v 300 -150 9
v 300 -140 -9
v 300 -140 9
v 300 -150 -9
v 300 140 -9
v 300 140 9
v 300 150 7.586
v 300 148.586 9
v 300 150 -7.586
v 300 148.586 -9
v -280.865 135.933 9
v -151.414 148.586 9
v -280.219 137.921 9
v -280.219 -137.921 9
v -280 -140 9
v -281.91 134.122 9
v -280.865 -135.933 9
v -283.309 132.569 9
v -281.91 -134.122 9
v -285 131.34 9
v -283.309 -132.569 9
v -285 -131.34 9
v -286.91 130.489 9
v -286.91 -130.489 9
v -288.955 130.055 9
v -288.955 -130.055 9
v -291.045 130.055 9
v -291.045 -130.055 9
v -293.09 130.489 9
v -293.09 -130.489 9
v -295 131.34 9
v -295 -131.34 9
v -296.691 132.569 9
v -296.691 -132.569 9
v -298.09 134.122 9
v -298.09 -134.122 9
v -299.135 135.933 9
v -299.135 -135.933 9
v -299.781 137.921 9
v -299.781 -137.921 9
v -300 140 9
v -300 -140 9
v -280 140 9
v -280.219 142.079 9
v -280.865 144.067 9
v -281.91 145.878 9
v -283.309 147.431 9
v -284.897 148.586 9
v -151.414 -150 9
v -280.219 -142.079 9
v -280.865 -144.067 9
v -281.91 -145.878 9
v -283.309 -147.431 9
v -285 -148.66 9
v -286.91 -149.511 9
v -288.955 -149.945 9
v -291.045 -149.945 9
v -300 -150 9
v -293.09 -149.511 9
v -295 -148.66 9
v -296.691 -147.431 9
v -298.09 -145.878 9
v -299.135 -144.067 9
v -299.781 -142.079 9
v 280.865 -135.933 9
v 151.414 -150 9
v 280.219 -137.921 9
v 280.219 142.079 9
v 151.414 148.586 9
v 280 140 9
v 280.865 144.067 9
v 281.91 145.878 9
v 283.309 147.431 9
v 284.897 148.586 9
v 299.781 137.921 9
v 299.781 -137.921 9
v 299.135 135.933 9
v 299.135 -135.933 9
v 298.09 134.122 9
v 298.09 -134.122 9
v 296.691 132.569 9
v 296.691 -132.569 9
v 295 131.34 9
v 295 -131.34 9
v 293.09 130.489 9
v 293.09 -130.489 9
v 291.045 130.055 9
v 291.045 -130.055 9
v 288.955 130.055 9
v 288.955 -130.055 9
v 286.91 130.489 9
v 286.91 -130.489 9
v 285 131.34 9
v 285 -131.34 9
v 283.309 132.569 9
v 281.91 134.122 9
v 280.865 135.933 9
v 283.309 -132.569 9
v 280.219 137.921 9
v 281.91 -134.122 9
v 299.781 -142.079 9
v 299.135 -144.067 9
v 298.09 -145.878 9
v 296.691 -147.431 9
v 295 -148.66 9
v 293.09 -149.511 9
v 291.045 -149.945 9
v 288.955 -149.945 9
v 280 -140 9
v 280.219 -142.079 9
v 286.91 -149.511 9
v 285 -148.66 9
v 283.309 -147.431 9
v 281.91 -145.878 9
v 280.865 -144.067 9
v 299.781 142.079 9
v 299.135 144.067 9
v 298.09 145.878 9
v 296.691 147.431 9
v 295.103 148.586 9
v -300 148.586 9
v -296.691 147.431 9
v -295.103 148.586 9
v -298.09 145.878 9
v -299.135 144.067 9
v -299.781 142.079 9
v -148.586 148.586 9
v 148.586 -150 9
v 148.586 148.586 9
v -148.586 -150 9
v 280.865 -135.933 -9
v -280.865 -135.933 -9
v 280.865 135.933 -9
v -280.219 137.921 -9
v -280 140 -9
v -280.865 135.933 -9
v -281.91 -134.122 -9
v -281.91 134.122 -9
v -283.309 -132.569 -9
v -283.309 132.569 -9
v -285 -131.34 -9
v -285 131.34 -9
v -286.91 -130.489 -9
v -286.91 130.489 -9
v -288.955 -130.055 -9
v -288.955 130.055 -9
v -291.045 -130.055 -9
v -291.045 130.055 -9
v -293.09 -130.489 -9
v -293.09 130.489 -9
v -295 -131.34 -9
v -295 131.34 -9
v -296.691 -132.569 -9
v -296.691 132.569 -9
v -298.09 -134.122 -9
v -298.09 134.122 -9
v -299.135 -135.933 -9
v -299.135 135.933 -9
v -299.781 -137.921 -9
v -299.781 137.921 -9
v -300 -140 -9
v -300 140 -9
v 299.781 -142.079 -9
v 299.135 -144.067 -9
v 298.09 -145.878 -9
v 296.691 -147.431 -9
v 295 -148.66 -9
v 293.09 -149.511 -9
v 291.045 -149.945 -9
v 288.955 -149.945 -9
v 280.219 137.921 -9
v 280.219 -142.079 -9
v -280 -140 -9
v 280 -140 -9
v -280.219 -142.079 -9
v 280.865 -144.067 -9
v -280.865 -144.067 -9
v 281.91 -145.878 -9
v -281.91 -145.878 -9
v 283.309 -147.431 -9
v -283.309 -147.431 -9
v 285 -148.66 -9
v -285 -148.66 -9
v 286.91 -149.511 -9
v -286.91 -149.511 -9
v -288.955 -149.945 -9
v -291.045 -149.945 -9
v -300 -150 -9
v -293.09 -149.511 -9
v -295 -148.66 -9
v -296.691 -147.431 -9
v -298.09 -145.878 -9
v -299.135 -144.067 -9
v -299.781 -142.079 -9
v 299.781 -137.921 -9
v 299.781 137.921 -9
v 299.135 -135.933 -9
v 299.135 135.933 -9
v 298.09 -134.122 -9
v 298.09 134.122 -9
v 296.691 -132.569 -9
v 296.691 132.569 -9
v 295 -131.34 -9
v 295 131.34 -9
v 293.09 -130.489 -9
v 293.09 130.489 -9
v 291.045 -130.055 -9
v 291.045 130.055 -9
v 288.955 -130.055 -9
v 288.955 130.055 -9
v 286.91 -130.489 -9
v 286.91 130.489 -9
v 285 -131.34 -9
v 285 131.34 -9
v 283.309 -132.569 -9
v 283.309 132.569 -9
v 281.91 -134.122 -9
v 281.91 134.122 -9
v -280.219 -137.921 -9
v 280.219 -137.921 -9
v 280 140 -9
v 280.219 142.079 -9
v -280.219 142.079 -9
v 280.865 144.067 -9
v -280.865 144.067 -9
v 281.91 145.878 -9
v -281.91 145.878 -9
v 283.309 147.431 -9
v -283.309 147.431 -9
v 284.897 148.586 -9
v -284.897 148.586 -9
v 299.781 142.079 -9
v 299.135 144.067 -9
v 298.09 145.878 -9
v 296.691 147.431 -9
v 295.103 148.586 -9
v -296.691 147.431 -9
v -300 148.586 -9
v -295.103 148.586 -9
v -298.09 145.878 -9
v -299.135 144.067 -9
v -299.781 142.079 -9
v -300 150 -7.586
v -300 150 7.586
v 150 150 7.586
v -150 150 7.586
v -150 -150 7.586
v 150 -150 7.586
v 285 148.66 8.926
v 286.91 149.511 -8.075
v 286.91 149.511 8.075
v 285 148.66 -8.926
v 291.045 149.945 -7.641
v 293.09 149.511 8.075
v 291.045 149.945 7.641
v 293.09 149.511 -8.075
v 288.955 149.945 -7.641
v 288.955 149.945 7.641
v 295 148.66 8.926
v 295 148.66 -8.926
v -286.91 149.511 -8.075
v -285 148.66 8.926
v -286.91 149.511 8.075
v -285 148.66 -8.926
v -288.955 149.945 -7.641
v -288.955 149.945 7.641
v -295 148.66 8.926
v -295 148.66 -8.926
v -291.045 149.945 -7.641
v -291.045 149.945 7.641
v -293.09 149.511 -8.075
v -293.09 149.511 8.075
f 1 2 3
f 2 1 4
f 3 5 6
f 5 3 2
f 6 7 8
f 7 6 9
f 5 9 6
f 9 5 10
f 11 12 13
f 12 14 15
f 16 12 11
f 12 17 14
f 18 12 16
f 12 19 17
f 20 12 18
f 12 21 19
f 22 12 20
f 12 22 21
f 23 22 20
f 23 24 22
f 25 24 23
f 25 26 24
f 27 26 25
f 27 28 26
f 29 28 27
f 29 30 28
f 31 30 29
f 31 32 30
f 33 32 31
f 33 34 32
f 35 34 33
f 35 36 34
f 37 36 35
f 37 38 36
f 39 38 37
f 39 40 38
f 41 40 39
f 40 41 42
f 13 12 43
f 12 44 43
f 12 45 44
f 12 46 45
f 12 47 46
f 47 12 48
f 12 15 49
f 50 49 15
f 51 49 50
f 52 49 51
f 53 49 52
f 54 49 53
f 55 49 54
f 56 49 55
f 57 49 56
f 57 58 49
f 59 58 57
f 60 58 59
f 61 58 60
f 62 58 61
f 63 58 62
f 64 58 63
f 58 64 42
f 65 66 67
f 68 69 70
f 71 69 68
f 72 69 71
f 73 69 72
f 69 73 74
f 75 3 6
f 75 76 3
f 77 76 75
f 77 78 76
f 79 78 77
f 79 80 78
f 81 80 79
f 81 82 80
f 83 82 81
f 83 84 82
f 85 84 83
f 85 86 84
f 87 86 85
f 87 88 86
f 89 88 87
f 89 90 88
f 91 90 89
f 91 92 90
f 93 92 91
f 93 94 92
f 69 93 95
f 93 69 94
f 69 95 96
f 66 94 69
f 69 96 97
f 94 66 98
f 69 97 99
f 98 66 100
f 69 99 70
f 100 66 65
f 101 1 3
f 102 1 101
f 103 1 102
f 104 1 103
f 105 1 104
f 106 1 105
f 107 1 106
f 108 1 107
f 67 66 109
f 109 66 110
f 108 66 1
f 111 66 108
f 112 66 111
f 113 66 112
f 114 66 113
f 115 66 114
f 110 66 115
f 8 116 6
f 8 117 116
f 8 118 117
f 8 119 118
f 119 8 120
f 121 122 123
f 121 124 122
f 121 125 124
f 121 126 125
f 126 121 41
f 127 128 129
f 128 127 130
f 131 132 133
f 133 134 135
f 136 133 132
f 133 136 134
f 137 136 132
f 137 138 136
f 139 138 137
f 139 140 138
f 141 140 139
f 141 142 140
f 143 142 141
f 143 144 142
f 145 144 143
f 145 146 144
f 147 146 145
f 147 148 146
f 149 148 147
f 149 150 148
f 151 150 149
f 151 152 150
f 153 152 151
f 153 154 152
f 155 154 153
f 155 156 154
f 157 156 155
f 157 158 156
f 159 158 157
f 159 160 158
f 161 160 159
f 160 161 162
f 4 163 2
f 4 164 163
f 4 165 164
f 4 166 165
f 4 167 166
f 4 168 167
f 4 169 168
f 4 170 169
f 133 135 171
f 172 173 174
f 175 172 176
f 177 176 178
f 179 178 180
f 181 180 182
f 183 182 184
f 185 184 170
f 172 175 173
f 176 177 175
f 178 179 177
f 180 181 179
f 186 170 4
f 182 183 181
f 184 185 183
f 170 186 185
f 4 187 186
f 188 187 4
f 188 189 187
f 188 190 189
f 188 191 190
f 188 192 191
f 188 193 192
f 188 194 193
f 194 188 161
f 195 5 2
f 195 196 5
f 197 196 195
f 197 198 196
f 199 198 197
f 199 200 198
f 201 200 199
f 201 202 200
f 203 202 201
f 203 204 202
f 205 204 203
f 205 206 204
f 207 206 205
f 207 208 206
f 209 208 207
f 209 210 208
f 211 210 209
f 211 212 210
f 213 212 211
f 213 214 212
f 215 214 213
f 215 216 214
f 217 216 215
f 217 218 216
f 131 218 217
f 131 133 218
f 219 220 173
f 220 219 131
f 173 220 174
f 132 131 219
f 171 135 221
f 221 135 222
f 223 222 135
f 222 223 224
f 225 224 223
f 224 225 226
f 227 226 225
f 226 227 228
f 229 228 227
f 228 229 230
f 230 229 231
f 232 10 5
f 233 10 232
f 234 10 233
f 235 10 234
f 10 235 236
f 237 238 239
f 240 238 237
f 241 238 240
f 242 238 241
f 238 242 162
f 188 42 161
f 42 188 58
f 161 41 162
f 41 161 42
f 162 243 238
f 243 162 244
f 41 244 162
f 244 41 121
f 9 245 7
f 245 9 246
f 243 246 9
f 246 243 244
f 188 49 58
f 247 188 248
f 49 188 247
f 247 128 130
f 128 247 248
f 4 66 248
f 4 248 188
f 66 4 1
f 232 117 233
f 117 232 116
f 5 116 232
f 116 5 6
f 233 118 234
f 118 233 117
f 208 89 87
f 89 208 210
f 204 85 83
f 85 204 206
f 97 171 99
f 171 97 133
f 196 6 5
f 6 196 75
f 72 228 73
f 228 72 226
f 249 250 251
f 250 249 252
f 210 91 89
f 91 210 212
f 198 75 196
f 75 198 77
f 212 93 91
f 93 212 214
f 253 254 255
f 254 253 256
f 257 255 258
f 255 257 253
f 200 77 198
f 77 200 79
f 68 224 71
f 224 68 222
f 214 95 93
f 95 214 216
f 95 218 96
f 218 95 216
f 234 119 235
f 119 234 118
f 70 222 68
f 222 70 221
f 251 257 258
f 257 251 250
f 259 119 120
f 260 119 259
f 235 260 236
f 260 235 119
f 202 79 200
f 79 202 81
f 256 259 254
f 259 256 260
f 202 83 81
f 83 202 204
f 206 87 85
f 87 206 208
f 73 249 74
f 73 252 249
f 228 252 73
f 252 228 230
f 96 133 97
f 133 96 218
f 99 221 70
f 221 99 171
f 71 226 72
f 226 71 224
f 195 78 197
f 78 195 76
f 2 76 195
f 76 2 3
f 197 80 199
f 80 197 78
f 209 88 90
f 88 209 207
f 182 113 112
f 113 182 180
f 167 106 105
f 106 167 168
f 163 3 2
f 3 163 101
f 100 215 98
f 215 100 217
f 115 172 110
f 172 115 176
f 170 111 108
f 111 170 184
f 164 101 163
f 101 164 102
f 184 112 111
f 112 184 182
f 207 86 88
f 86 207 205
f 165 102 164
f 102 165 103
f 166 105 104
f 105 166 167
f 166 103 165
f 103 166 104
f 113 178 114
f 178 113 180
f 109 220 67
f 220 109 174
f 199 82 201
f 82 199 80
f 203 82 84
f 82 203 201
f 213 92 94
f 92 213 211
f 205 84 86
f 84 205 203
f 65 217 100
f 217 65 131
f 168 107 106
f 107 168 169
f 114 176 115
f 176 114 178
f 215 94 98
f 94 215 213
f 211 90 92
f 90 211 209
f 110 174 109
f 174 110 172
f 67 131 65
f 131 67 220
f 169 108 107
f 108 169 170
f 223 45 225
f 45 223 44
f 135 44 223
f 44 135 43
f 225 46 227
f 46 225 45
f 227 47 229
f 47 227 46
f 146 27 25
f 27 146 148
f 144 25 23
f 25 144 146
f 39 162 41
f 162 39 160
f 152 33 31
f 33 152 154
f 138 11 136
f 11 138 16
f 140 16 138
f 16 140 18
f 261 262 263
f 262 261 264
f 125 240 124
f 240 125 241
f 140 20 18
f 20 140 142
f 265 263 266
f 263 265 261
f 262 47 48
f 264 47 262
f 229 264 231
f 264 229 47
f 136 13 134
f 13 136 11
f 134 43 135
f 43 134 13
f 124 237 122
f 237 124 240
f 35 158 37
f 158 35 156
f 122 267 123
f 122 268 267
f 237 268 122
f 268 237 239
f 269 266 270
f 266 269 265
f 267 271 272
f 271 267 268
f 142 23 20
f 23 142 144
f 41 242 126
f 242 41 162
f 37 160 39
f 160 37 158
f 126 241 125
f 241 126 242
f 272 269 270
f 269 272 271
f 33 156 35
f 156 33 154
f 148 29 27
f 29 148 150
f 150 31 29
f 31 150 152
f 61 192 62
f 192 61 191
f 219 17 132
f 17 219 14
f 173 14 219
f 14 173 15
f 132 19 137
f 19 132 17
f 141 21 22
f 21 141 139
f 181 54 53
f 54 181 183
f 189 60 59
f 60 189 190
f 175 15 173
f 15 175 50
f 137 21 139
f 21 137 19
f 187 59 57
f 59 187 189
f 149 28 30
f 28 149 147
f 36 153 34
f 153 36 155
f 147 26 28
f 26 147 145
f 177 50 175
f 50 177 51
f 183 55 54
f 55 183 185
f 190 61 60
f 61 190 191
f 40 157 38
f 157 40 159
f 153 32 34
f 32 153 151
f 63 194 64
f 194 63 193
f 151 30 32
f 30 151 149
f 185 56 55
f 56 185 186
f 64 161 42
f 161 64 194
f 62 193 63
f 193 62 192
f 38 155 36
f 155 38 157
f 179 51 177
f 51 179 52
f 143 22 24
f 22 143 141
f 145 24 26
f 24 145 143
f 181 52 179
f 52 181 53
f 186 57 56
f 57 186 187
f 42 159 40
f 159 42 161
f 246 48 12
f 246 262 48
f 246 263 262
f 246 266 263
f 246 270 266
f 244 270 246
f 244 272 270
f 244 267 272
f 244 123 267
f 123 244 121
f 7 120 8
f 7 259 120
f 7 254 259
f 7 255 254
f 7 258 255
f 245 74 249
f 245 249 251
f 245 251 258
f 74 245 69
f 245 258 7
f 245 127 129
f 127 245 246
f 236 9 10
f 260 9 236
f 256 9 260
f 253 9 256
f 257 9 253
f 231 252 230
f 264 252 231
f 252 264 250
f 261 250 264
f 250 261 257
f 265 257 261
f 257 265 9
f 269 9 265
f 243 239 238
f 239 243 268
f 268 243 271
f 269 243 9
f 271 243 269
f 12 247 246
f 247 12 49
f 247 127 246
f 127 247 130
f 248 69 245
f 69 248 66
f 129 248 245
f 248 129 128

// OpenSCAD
// Parameters
sheet_L = 600; //[300:1200:1]
sheet_W = 300; //[150:600:1]
sheet_T = 18; //[9:36:1]
corner_R = 10; //[2:30:1]
chamfer_C = 2; //[0.5:6:0.5]
overlap = 1; //[0.5:2:0.5]

// Base Shapes
module mdf_sheet() {
  color([0.85, 0.85, 0.8]) // MDF color
  cube([sheet_L, sheet_W, sheet_T], center=true);
}

module corner_rounding() {
  color([0.85, 0.85, 0.8])
  cylinder(r=corner_R, h=sheet_T + 2*overlap, center=true);
}

module edge_chamfer() {
  color([0.85, 0.85, 0.8])
  rotate([45, 0, 0])
  cube([sheet_L + 2*overlap, chamfer_C, chamfer_C], center=true);
}

module label_text() {
  color([0.85, 0.85, 0.8])
  cube([sheet_L/10, sheet_W/10, sheet_T/10], center=true);
}

// Operations
module corner_rounding_tr() {
  translate([sheet_L/2 - corner_R, sheet_W/2 - corner_R, 0])
  corner_rounding();
}

module corner_rounding_tl() {
  translate([sheet_L/2 - corner_R, -(sheet_W/2 - corner_R), 0])
  corner_rounding();
}

module corner_rounding_br() {
  translate([-(sheet_L/2 - corner_R), sheet_W/2 - corner_R, 0])
  corner_rounding();
}

module corner_rounding_bl() {
  translate([-(sheet_L/2 - corner_R), -(sheet_W/2 - corner_R), 0])
  corner_rounding();
}

module edge_chamfer_top() {
  translate([0, sheet_W/2 - chamfer_C/2 + overlap, sheet_T/2 - chamfer_C/2 + overlap])
  edge_chamfer();
}

module edge_chamfer_bottom() {
  mirror([0, 0, 1])
  edge_chamfer_top();
}

module edge_chamfer_right() {
  rotate([0, 0, 90])
  edge_chamfer_top();
}

module edge_chamfer_left() {
  mirror([1, 0, 0])
  edge_chamfer_right();
}

// Final Model
module complete_model() {
  difference() {
    mdf_sheet();
    corner_rounding_tr();
    corner_rounding_tl();
    corner_rounding_br();
    corner_rounding_bl();
    edge_chamfer_top();
    edge_chamfer_bottom();
    edge_chamfer_right();
    edge_chamfer_left();
  }
  label_text();
}

// Render the complete model
complete_model();
